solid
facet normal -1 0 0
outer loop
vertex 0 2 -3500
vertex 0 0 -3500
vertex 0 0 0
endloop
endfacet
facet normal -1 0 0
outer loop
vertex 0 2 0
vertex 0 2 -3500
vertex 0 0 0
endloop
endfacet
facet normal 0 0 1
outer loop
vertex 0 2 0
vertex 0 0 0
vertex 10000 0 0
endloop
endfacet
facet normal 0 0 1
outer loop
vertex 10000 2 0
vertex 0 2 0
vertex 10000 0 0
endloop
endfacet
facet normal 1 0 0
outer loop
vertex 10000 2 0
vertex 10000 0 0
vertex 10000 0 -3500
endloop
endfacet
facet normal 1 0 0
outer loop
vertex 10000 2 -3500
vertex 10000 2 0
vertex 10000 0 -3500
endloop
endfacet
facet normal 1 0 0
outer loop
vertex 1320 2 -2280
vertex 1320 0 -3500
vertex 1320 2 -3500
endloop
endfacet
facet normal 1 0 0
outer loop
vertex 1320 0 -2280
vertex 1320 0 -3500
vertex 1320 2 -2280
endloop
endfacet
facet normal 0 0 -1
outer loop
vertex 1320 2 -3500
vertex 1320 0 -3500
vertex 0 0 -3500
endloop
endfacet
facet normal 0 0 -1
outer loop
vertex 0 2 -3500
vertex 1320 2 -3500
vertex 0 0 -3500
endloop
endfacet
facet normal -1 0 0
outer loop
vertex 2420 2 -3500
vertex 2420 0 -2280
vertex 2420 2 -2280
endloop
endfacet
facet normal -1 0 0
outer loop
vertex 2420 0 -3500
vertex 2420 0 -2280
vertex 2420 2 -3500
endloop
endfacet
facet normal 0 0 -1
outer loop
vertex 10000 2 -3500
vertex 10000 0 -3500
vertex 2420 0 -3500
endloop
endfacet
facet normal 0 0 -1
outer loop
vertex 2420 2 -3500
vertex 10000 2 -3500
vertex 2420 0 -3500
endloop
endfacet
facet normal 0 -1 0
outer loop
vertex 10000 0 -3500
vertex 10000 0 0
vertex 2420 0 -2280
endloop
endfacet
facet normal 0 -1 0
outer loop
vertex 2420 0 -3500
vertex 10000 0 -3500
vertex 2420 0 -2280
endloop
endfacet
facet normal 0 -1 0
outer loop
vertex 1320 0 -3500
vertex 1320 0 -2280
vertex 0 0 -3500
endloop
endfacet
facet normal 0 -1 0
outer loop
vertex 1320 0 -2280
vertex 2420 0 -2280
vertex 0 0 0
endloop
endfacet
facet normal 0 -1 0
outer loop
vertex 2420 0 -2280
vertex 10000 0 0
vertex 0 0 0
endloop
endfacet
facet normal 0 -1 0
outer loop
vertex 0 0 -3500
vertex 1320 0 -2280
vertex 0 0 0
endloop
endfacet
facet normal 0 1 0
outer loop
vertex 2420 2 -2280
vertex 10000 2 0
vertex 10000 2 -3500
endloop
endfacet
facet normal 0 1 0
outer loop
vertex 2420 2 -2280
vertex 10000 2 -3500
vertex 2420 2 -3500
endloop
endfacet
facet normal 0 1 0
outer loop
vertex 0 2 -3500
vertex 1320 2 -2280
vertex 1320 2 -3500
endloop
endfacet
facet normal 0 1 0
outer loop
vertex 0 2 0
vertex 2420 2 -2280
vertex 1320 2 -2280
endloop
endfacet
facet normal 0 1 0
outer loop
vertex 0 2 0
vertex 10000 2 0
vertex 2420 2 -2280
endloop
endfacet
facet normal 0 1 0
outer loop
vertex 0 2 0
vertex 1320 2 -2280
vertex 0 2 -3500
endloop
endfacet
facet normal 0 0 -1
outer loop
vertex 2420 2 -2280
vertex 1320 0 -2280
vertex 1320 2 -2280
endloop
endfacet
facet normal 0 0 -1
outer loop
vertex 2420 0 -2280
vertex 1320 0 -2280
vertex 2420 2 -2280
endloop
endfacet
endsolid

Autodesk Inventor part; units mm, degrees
ref_plane "YZ Plane" through (0, 0, 0) normal (1, 0, 0) x (0, 1, 0)
ref_plane "XZ Plane" through (0, 0, 0) normal (0, 1, 0) x (-1, 0, 0)
ref_plane "XY Plane" through (0, 0, 0) normal (0, 0, 1) x (1, 0, 0)
sketch "Sketch1" plane through (0, 0, 0) normal (0, 1, 0) x (-1, 0, 0)
  line L0 (0, 0) -> (-10000, 0)
  line L1 (-10000, 0) -> (-10000, -3500)
  line L2 (-10000, -3500) -> (0, -3500)
  line L3 (0, -3500) -> (0, 0)
  dimension "d0" = 10000
  dimension "d1" = 3500
extrude "Plate1" add sketch "Sketch1" along normal blind 2
sketch "Sketch2" plane through (0, 0, 0) normal (0, -1, 0) x (1, 0, 0)
  line L0 (2420, 112.7521) -> (2420, -3617.2479) projected
  line L1 (900, -3726) -> (900, 226) projected
  line L2 (10000, -3500) -> (0, -3500) projected
  line L3 (2420, -3500) -> (1320, -3500)
  line L4 (1320, -3500) -> (1320, -2280)
  line L5 (1320, -2280) -> (2420, -2280)
  line L6 (2420, -2280) -> (2420, -3500)
  line L7 (1353.8656, -2345.1271) -> (1353.8656, -2281.1191) projected
  point P0 (0, 0)
  point P1 (2420, -2280)
  dimension "d3" = 1100
  dimension "d4" = 1220
extrude "Cut1" cut sketch "Sketch2" against normal blind 2
equation "\"d5\" = Thickness"
equation "\"d2\" = Thickness"
equation "\"BendRadius\" = Thickness"
equation "\"BendReliefWidth\" = Thickness"
equation "\"BendReliefDepth\" = 0.5 * Thickness"
equation "\"CornerReliefSize\" = 4 * Thickness"
equation "\"MinimumRemnant\" = 2 * Thickness"
equation "\"TransitionRadius\" = BendRadius"
equation "\"JacobiRadiusSize\" = BendRadius"
equation "\"GapSize\" = Thickness"
equation "\"Thickness\" = 2"
properties part number "Floor, Floor" material "Polypropylene"
